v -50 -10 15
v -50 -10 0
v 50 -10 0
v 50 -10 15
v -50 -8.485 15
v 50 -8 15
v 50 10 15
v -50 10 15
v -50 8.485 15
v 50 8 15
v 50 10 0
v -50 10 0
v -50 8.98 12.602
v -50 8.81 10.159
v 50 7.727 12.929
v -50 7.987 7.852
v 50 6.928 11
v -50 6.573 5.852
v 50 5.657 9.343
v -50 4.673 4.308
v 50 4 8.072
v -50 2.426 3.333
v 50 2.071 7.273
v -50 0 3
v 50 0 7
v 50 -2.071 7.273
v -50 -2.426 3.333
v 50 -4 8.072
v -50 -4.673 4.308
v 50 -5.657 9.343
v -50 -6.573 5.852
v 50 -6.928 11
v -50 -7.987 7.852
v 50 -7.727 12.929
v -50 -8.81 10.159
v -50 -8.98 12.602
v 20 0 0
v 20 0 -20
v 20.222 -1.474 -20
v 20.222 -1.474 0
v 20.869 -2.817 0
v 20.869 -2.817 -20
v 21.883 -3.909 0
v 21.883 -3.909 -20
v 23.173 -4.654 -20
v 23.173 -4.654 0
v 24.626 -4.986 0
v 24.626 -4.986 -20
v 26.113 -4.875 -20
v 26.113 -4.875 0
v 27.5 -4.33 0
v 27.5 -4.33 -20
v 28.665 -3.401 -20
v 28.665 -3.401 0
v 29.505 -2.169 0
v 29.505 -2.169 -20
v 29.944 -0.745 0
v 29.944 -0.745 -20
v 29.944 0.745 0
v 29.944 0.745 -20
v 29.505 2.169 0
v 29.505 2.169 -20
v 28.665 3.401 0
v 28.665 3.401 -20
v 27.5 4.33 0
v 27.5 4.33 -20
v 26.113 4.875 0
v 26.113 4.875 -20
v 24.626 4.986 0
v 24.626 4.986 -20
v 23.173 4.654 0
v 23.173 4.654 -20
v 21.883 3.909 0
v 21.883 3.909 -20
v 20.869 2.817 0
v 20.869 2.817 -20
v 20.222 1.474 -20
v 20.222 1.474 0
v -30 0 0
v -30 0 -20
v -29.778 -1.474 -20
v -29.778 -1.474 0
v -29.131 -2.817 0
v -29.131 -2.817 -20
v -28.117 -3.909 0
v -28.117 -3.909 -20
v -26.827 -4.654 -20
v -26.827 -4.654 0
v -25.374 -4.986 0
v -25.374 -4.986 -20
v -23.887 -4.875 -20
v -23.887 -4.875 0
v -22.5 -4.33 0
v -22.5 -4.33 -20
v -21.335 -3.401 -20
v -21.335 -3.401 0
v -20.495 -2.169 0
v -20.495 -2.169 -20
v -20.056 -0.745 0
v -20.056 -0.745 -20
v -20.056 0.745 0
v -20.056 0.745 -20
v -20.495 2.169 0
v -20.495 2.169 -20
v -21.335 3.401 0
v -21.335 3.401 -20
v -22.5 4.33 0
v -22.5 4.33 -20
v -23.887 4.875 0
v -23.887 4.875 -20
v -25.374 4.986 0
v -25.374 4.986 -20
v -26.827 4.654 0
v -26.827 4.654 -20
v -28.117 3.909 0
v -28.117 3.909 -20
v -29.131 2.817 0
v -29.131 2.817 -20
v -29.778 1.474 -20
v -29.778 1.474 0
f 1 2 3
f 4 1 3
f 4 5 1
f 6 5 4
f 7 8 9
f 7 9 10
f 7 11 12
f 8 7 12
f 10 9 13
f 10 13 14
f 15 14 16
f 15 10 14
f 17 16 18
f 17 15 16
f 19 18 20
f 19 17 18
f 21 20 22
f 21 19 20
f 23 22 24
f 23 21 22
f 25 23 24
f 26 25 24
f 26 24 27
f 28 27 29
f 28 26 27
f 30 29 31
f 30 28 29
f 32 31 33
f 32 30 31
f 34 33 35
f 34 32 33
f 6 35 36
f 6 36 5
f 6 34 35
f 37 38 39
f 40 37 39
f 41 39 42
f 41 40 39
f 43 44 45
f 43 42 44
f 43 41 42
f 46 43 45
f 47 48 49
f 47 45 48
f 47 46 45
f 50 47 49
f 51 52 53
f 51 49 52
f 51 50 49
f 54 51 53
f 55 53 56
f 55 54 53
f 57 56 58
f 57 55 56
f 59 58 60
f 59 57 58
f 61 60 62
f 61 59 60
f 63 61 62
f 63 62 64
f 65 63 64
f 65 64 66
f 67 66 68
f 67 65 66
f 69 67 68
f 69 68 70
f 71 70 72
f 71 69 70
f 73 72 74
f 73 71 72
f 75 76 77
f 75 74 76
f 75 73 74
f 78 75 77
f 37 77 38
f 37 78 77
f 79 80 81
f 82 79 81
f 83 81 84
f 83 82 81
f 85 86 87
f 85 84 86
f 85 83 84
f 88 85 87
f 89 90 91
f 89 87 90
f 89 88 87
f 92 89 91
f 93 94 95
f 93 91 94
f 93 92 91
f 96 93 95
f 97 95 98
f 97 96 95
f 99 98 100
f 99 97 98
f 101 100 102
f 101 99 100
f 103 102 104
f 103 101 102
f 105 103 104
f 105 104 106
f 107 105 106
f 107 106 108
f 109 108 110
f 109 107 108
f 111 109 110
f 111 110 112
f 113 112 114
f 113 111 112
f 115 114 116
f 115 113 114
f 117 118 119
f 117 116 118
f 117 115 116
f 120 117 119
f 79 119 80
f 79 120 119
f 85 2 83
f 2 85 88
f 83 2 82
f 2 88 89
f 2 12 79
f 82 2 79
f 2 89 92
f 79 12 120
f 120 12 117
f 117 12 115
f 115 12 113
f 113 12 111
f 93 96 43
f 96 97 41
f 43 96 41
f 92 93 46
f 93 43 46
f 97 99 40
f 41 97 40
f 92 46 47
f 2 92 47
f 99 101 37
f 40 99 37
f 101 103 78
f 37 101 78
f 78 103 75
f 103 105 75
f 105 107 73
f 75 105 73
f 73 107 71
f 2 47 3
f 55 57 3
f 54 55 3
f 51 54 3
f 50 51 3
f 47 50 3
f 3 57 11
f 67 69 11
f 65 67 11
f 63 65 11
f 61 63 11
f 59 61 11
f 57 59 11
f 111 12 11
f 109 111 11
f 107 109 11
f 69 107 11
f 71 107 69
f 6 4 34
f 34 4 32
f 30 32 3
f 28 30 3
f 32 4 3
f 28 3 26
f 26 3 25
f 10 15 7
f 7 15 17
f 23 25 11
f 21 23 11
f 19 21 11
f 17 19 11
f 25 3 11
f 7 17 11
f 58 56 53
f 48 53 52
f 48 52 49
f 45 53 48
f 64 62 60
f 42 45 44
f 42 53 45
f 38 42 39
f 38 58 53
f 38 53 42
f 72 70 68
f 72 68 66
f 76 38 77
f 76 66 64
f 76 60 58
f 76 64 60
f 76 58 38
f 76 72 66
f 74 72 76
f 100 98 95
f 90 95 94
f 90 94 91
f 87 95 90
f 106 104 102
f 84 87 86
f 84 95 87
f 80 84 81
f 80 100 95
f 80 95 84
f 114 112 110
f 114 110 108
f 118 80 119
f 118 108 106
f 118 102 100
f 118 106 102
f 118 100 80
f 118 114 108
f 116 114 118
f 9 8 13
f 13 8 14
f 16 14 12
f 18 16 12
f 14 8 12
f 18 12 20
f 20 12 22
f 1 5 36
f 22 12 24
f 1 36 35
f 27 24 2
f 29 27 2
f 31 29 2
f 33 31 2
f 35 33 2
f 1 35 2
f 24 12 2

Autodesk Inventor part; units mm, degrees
ref_plane "YZ Plane" through (0, 0, 0) normal (1, 0, 0) x (0, 1, 0)
ref_plane "XZ Plane" through (0, 0, 0) normal (0, 1, 0) x (-1, 0, 0)
ref_plane "XY Plane" through (0, 0, 0) normal (0, 0, 1) x (1, 0, 0)
sketch "草圖1" plane through (0, 0, 0) normal (0, 0, 1) x (1, 0, 0)
  line L0 (-50, -10) -> (50, -10)
  line L1 (50, -10) -> (50, 10)
  line L2 (50, 10) -> (-50, 10)
  line L3 (-50, 10) -> (-50, -10)
  line L4 (-50, -10) -> (50, 10) construction
  line L5 (50, -10) -> (-50, 10) construction
  point P0 (0, 0)
  dimension "d0" = 20
  dimension "d1" = 100
extrude "擠出1" add sketch "草圖1" along normal blind 15
sketch "草圖2" plane through (50, -10, 0) normal (1, 0, 0) x (0, 0, -1)
  circle A0 centre (-15, 10) radius 8
  line L0 (0, 0) -> (0, 20) projected
  point P0 (0, 10)
  dimension "d4" = 16
  dimension "d5" = 15
sketch "草圖3" plane through (-50, -10, 0) normal (-1, 0, 0) x (0, 0, 1)
  circle A0 centre (12, 10) radius 9
  line L0 (0, 20) -> (0, 0) projected
  point P0 (0, 10)
  dimension "d6" = 18
  dimension "d7" = 12
sketch "草圖4" plane through (0, 0, 15) normal (0, 0, 1) x (1, 0, 0)
  line L0 (49.8919, 0) -> (-50, 0)
  line L1 (-50, 10) -> (-50, -10) projected
  point P0 (0, 0)
loft "斷面混成1" cut profiles "草圖3", "草圖2"
sketch "草圖5" plane through (0, 0, 0) normal (0, 0, -1) x (-1, 0, 0)
  circle A0 centre (25, 0) radius 5
  circle A1 centre (-25, 0) radius 5
  point P0 (0, 0)
  dimension "d12" = 10
  dimension "d13" = 10
  dimension "d14" = 50
  dimension "d15" = 25
extrude "擠出2" add sketch "草圖5" along normal blind 20
properties part number "滑軌2"
